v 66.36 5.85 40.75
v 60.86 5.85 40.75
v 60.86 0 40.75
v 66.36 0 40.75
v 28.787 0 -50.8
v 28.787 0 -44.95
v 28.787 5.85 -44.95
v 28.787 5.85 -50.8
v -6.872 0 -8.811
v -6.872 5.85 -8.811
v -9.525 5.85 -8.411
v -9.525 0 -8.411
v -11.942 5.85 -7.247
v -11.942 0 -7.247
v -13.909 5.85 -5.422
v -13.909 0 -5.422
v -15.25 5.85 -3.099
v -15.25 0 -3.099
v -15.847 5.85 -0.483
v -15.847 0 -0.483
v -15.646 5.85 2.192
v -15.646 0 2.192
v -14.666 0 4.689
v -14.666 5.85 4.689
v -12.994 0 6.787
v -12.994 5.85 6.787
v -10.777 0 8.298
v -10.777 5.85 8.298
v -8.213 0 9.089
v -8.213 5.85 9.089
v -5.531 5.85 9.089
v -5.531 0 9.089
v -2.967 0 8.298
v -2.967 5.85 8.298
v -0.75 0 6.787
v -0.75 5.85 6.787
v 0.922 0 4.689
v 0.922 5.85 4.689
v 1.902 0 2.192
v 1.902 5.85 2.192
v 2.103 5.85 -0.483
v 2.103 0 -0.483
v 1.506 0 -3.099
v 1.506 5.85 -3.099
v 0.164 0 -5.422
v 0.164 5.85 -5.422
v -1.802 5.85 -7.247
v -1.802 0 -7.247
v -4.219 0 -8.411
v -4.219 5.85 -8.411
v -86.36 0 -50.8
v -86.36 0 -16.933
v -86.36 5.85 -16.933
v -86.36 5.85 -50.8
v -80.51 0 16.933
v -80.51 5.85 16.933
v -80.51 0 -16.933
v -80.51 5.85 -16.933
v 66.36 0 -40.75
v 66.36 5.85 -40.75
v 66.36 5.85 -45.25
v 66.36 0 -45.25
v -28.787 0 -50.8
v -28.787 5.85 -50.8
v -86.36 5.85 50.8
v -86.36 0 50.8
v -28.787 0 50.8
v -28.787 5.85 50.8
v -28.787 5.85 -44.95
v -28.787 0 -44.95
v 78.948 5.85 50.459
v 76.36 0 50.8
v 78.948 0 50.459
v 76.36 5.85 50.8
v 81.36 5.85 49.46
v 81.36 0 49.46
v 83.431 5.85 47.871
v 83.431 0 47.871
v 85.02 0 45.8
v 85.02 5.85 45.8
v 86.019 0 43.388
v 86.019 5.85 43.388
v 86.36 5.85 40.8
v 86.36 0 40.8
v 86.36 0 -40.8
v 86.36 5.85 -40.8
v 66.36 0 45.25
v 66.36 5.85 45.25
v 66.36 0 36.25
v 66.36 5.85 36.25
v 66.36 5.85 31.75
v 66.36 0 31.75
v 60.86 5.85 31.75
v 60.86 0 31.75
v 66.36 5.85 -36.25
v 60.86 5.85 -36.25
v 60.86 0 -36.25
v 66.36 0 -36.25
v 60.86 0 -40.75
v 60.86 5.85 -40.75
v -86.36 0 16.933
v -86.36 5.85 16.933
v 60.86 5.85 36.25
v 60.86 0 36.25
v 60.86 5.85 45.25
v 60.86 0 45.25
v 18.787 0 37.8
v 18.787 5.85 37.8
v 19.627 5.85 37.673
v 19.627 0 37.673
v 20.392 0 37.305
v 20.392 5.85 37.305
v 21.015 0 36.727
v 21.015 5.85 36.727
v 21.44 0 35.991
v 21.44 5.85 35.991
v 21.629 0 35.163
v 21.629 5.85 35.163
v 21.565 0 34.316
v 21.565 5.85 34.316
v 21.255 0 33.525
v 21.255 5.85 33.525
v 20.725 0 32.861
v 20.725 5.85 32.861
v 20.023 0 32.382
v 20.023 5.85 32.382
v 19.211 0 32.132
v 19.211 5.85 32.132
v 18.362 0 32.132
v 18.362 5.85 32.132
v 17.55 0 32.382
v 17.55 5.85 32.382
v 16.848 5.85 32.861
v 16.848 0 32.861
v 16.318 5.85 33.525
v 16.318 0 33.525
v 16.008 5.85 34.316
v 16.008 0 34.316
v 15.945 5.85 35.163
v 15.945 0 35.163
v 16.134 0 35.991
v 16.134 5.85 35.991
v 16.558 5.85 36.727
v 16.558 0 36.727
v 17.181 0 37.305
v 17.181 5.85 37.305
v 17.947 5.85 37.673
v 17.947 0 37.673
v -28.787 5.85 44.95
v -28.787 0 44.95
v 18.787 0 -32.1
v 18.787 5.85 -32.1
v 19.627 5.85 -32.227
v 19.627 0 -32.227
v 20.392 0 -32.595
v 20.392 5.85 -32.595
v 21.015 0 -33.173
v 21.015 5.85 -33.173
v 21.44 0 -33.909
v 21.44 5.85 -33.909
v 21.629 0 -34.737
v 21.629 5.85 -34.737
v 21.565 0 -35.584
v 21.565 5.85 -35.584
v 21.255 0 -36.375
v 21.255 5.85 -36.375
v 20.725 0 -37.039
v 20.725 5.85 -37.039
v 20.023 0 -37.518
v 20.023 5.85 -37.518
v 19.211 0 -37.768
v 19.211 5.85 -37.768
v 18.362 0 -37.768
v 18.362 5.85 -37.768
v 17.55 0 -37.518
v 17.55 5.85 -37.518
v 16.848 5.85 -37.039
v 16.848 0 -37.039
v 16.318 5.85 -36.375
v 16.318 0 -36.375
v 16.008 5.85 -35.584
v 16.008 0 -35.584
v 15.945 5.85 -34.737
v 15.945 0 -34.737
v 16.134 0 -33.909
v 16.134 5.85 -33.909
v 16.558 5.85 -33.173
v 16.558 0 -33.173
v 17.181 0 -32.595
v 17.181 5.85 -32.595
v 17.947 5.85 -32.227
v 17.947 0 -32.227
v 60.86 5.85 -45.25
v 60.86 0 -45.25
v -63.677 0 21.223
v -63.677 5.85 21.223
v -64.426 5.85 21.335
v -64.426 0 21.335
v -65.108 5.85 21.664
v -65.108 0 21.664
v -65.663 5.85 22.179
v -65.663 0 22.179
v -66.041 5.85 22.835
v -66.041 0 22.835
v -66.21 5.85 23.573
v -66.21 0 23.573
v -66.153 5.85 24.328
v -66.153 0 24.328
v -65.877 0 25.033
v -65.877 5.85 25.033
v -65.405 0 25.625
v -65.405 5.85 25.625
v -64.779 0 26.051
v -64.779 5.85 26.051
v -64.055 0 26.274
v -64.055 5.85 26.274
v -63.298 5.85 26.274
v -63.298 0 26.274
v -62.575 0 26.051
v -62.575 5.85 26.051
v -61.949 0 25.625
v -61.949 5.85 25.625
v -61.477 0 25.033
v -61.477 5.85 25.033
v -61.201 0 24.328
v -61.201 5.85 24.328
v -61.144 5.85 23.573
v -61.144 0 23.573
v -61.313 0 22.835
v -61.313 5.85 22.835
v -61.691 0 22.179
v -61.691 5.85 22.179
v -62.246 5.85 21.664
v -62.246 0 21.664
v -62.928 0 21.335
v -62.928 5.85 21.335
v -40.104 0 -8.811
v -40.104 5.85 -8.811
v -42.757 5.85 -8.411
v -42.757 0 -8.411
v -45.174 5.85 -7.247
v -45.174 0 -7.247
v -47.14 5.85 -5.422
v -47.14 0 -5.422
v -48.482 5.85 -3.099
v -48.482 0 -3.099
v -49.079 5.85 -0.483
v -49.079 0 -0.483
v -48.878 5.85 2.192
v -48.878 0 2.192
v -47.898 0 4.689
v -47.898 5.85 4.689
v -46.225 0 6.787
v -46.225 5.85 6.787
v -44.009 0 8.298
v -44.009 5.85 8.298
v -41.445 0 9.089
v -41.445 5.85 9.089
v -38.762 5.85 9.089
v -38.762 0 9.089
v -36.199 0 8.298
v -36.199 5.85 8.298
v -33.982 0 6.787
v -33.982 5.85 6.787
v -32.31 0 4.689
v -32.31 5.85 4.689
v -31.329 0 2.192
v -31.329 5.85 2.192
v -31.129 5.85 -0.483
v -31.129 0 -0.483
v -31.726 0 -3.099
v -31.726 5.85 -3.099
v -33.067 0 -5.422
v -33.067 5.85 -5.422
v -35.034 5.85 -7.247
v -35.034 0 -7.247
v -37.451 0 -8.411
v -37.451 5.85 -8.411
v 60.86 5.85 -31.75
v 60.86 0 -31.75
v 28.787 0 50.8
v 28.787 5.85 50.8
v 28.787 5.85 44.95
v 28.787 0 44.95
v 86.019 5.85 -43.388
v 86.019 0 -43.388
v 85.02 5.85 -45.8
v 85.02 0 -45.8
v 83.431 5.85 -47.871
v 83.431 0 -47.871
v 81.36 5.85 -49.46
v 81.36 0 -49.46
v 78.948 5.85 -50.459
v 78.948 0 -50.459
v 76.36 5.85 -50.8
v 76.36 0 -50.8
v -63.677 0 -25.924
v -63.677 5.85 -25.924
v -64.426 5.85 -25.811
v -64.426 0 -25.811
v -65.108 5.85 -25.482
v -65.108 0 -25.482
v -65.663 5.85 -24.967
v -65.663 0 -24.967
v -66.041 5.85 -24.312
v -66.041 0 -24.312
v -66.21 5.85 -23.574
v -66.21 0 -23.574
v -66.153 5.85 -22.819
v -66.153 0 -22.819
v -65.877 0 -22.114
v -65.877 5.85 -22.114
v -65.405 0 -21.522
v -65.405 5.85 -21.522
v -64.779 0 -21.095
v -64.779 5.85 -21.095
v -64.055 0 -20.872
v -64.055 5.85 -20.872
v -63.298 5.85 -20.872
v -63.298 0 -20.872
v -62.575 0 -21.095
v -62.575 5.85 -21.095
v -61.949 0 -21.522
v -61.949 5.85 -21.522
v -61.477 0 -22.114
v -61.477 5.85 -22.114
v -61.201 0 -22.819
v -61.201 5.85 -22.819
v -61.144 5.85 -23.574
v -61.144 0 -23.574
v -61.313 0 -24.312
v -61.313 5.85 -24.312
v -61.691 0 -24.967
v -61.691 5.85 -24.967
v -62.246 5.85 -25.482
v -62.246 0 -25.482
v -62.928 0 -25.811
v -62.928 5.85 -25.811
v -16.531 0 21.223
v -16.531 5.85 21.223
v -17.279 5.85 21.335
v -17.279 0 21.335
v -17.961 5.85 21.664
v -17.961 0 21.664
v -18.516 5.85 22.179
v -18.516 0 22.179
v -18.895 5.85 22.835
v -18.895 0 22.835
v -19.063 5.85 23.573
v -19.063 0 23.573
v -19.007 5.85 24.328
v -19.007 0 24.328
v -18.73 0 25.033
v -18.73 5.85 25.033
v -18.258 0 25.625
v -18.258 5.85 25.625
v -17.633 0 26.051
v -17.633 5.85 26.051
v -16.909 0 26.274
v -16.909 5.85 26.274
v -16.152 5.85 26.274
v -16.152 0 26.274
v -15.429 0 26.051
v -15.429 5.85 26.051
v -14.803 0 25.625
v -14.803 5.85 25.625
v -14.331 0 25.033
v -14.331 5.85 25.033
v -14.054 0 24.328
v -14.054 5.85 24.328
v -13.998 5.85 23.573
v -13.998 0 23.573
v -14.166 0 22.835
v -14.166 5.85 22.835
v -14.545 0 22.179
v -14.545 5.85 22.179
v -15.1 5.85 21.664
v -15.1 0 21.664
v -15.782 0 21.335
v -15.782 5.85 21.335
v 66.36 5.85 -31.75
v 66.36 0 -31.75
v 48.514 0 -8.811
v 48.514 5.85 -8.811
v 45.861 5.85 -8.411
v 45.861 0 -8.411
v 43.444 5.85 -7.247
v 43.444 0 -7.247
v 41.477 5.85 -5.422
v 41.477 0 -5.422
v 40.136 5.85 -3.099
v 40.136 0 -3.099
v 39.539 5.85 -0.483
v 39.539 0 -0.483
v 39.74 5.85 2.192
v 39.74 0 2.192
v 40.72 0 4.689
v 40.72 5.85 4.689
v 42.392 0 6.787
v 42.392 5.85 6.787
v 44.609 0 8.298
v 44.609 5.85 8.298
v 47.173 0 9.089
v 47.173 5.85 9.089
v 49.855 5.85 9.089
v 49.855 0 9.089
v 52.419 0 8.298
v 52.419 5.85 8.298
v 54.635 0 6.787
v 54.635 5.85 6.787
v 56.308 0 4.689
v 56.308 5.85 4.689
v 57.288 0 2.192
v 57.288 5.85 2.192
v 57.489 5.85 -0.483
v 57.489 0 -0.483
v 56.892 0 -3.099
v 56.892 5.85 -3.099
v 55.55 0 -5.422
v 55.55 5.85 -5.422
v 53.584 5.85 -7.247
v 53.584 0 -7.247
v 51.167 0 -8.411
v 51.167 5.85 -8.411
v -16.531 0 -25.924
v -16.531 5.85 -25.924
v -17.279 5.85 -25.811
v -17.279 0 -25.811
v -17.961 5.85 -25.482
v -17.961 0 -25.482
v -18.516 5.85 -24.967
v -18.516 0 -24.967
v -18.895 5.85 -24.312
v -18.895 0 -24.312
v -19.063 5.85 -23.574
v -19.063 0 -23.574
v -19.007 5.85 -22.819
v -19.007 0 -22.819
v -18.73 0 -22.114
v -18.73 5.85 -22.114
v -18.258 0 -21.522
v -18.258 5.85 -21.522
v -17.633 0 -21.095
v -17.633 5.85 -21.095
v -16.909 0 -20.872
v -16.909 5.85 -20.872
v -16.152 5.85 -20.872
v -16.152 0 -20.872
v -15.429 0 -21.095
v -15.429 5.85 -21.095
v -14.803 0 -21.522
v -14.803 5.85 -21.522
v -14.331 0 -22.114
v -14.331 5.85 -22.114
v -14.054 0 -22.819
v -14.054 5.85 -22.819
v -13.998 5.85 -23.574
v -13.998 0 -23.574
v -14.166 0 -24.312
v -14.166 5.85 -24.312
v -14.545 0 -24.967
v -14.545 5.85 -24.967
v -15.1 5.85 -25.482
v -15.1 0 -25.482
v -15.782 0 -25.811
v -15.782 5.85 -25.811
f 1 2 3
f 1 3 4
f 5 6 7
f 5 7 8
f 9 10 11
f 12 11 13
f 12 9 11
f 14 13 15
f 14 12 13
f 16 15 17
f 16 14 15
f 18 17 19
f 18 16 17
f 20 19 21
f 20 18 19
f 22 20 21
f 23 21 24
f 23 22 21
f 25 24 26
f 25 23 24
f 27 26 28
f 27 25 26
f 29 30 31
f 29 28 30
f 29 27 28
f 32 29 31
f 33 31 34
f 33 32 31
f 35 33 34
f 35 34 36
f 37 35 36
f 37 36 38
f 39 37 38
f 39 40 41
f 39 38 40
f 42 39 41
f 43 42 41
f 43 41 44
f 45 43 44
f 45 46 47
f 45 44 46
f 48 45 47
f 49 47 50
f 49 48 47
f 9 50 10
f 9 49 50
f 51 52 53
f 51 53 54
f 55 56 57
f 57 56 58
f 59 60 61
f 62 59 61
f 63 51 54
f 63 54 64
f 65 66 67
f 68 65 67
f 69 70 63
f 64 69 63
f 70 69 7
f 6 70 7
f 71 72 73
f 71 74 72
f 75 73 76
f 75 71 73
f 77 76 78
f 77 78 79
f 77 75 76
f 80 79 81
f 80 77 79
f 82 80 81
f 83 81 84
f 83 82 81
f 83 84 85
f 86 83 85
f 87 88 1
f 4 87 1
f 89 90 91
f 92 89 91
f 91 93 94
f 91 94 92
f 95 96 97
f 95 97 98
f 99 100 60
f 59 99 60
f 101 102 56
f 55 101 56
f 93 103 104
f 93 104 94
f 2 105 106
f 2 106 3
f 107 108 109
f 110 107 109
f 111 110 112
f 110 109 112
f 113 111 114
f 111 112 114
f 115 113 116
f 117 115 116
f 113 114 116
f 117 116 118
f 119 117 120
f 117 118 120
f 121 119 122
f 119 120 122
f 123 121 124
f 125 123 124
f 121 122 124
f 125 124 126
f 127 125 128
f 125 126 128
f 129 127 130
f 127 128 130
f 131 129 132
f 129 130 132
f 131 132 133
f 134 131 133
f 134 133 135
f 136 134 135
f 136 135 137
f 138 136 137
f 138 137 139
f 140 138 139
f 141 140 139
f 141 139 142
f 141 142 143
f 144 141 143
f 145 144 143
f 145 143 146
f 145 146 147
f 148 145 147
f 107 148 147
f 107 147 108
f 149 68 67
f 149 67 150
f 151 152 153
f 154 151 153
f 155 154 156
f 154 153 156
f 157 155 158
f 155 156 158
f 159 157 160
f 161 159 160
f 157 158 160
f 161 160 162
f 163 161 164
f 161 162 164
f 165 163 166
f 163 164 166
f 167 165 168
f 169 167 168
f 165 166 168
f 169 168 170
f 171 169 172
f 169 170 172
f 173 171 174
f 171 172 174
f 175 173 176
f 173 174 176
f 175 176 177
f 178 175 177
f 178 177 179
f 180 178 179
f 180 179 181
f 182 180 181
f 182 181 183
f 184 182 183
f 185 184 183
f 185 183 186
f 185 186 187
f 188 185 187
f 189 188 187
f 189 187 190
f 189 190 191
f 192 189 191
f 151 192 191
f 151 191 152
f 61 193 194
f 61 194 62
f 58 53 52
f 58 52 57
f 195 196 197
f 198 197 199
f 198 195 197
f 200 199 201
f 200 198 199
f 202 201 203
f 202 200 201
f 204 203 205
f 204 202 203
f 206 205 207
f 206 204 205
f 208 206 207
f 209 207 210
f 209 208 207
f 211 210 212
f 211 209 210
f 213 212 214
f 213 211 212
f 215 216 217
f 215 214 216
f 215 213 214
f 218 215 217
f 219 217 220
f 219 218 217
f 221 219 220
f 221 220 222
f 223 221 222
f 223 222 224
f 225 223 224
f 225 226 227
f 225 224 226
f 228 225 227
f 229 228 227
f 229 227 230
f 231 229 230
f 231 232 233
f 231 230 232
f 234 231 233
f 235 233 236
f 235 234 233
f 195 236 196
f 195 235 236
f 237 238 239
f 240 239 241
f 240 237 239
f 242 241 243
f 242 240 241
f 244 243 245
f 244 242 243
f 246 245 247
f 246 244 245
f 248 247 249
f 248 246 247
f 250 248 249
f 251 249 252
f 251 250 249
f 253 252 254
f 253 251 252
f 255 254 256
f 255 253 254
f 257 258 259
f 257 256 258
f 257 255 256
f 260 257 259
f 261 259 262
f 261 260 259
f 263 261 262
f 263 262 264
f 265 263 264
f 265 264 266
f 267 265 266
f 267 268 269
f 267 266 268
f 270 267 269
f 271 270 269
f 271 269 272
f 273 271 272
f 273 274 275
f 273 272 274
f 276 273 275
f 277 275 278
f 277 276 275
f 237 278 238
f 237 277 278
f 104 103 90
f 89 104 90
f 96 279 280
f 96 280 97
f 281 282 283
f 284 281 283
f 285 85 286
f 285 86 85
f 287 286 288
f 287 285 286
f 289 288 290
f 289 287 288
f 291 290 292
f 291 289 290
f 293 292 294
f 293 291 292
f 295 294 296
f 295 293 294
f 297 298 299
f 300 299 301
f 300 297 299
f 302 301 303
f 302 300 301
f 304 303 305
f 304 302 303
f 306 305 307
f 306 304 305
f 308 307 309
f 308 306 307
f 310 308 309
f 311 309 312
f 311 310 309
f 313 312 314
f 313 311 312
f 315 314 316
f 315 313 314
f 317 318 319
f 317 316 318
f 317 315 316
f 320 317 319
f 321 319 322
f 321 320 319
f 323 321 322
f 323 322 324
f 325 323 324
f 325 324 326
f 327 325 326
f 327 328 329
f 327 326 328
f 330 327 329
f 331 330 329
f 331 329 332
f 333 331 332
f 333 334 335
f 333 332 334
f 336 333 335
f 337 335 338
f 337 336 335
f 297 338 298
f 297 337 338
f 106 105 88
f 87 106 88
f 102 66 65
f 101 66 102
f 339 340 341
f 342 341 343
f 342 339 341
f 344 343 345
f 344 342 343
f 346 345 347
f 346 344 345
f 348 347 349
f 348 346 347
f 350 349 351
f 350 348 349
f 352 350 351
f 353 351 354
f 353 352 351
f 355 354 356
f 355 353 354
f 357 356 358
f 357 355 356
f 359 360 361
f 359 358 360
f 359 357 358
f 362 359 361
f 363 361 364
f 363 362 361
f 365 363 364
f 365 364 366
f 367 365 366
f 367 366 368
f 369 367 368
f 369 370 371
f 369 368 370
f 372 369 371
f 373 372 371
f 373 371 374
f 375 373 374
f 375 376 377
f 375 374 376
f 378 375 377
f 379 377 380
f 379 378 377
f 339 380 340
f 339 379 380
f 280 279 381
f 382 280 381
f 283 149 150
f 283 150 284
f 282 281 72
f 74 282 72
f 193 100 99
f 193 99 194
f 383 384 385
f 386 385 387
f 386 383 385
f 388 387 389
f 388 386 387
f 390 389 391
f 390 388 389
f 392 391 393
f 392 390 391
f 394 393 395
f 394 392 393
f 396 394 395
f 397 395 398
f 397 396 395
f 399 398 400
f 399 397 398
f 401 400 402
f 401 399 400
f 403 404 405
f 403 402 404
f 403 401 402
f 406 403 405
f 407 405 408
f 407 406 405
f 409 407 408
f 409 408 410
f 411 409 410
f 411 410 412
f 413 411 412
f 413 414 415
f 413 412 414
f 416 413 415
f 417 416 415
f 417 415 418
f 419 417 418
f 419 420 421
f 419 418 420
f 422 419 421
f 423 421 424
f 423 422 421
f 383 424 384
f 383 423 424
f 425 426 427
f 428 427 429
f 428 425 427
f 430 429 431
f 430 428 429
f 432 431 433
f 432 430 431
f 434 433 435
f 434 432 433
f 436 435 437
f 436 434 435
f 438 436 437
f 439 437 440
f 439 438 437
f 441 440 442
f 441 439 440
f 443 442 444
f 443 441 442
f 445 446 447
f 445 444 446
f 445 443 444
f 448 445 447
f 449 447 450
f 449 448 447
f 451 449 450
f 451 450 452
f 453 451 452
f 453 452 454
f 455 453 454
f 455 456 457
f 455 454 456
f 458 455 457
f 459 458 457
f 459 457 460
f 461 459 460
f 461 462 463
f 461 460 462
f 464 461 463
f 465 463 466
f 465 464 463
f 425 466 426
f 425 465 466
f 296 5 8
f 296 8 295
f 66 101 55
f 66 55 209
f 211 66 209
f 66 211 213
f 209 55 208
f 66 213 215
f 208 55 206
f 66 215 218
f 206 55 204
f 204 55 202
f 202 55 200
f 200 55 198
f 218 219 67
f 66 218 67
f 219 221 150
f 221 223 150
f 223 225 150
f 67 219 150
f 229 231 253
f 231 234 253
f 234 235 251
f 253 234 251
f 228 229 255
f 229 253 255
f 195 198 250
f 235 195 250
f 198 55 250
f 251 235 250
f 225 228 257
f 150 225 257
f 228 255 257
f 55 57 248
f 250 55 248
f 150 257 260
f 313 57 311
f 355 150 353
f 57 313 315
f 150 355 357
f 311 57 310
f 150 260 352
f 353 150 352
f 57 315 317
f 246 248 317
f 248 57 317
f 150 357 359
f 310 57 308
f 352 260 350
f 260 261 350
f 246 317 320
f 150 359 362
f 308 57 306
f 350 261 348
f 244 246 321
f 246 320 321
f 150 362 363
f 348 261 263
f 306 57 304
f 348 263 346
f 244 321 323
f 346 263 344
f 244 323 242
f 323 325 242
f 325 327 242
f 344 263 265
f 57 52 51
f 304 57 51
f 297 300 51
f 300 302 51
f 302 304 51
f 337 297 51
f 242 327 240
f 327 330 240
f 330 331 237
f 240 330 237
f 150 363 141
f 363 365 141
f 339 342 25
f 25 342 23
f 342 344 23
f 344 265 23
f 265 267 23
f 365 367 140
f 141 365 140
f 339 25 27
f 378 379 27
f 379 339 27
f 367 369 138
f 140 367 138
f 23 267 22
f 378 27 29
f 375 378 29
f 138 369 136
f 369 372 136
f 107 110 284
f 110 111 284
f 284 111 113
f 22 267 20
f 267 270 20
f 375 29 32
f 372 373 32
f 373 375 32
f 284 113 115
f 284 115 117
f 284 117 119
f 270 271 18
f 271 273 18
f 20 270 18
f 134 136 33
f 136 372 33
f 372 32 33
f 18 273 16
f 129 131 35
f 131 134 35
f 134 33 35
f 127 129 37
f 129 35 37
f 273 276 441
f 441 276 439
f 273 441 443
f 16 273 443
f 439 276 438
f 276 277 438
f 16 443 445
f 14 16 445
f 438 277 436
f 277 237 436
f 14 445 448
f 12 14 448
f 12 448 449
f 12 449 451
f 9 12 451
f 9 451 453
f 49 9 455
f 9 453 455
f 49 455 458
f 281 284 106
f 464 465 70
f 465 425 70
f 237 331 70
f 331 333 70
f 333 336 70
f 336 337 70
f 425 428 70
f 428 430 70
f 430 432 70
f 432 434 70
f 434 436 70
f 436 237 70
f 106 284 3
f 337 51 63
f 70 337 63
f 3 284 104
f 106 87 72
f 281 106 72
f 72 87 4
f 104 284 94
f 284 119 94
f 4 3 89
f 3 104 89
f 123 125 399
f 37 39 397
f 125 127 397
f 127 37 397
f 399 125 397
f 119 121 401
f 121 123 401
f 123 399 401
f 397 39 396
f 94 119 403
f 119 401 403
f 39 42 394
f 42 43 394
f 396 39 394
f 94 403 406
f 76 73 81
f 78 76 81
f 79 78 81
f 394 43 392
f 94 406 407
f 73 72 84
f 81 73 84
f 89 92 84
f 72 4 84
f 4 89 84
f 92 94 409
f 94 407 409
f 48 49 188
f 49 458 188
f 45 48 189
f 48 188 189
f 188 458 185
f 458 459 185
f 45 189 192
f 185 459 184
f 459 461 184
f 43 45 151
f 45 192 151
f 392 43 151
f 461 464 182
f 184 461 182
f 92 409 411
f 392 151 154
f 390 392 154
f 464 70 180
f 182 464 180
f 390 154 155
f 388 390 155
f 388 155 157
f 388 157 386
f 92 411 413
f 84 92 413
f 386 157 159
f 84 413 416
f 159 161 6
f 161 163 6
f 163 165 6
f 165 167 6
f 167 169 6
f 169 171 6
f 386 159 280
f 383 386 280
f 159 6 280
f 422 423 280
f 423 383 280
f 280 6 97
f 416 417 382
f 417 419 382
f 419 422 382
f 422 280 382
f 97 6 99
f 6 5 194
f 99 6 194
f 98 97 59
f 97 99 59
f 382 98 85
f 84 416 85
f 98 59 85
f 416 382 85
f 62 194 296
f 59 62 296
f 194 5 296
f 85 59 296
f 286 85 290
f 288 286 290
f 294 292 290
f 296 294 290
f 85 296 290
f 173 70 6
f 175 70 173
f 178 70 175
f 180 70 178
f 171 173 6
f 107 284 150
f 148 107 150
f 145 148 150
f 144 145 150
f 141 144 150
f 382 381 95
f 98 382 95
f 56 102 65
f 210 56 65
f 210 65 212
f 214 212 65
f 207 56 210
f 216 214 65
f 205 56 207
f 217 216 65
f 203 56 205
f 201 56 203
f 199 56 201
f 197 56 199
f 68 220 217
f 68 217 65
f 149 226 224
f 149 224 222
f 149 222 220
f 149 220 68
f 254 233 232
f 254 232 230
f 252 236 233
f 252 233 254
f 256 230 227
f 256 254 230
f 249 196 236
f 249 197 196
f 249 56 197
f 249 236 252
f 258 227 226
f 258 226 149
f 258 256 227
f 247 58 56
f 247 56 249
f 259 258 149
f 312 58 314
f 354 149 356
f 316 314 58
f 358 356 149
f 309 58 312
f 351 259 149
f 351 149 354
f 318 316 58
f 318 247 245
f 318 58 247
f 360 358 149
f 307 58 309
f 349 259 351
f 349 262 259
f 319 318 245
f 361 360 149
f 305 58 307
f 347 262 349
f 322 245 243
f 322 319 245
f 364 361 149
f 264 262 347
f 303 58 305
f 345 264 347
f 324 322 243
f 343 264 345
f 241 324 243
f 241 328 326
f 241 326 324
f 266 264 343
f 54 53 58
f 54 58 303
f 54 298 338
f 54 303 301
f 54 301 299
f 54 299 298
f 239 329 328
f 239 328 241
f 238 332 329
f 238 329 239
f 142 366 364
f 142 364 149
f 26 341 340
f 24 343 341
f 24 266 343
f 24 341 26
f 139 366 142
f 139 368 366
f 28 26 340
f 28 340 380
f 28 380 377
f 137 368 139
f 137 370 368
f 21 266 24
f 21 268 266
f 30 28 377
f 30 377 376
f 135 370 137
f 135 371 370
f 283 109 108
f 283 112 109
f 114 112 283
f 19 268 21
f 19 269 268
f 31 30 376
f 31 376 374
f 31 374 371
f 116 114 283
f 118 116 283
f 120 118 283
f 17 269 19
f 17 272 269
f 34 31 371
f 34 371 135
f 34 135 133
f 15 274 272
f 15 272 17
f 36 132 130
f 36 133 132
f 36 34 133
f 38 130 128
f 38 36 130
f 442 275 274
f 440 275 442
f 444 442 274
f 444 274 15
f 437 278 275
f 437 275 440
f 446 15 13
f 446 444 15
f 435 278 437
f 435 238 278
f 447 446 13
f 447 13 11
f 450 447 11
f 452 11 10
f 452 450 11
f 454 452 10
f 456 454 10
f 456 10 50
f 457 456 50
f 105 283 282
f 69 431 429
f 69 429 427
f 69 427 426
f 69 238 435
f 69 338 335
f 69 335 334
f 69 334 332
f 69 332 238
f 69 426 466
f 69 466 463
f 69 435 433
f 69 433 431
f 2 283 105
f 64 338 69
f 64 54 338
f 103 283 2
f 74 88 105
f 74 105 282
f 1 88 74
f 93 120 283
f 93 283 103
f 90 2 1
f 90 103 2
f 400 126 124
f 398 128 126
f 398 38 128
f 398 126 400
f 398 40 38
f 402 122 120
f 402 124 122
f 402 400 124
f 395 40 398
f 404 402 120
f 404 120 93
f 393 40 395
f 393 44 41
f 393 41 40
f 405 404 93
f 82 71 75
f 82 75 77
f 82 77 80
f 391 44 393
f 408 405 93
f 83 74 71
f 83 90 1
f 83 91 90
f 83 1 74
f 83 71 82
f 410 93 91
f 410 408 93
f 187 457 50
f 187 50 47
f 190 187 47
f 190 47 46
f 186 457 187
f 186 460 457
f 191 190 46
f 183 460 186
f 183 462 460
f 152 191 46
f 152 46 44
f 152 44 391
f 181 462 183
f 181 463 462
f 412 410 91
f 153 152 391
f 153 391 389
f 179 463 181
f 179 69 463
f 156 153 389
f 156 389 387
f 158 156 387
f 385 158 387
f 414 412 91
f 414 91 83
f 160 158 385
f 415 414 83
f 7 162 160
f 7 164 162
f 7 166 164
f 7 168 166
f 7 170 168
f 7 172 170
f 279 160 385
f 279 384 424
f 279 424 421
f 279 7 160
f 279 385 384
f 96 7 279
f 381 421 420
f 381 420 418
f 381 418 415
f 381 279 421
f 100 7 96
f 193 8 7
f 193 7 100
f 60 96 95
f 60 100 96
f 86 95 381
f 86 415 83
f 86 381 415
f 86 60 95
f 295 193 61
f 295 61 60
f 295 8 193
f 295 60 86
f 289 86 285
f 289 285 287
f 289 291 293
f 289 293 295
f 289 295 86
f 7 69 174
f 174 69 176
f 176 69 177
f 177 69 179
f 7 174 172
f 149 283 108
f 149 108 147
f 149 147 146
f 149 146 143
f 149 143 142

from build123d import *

# Parameters (mm, degrees)
SKETCH1_W           = 172.72
SKETCH1_H           = 101.6
BOSS_EXTRUDE1_DEPTH = 5.85
SKETCH4_W           = 5.85
SKETCH4_H           = 33.866666666
SKETCH4_W_2         = 57.573333334
SKETCH4_H_2         = 5.85
SKETCH4_W_3         = 5.5
SKETCH4_H_3         = 4.5
CUT_EXTRUDE5_DEPTH  = 10
SKETCH5_R           = 9
SKETCH5_R_2         = 2.54
CUT_EXTRUDE10_DEPTH = 16
FILLET1_R           = 10
SKETCH6_R           = 2.85
CUT_EXTRUDE11_DEPTH = 10


with BuildPart() as part:
    # Sketch1 → Boss-Extrude1 (new body)
    with BuildSketch(Plane(origin=(0, 0, 0), x_dir=(1, 0, 0), z_dir=(0, 1, 0))):
        Rectangle(SKETCH1_W, SKETCH1_H)
    extrude(amount=BOSS_EXTRUDE1_DEPTH)

    # Sketch4 → Cut-Extrude5 (cut)
    with BuildSketch(Plane(origin=(0, 5.85, 0), x_dir=(1, 0, 0), z_dir=(0, 1, 0))):
        with Locations((-83.435, 0)):
            Rectangle(SKETCH4_W, SKETCH4_H)
        with Locations((0, -47.875)):
            Rectangle(SKETCH4_W_2, SKETCH4_H_2)
        with Locations((0, 47.875)):
            Rectangle(SKETCH4_W_2, SKETCH4_H_2)
        with Locations((63.61, 43)):
            Rectangle(SKETCH4_W_3, SKETCH4_H_3)
        with Locations((63.61, -43)):
            Rectangle(SKETCH4_W_3, SKETCH4_H_3)
        with Locations((63.61, -34)):
            Rectangle(SKETCH4_W_3, SKETCH4_H_3)
        with Locations((63.61, 34)):
            Rectangle(SKETCH4_W_3, SKETCH4_H_3)
    extrude(amount=-CUT_EXTRUDE5_DEPTH, mode=Mode.SUBTRACT)

    # Sketch5 → Cut-Extrude10 (cut)
    with BuildSketch(Plane(origin=(0, 0, 0), x_dir=(1, 0, 0), z_dir=(0, 1, 0))):
        with Locations((-6.8720506, -0.189440326)):
            Circle(SKETCH5_R)
        with Locations((-40.10375, -0.189440326)):
            Circle(SKETCH5_R)
        with Locations((-63.676922318, 23.383731992)):
            Circle(SKETCH5_R_2)
        with Locations((-16.530577682, 23.383731992)):
            Circle(SKETCH5_R_2)
        with Locations((-63.676922318, -23.762612643)):
            Circle(SKETCH5_R_2)
        with Locations((-16.530577682, -23.762612643)):
            Circle(SKETCH5_R_2)
        with Locations((48.5139194, -0.189440326)):
            Circle(SKETCH5_R)
    extrude(amount=CUT_EXTRUDE10_DEPTH, mode=Mode.SUBTRACT)

    # Fillet1
    fillet1_edges = [part.edges().sort_by_distance(p)[0] for p in [
        (86.36, 2.925, -50.8),
        (86.36, 2.925, 50.8),
    ]]
    fillet(fillet1_edges, radius=FILLET1_R)

    # Sketch6 → Cut-Extrude11 (cut)
    with BuildSketch(Plane(origin=(0, 5.85, 0), x_dir=(1, 0, 0), z_dir=(0, 1, 0))):
        with Locations((18.786666667, -34.95)):
            Circle(SKETCH6_R)
        with Locations((18.786666667, 34.95)):
            Circle(SKETCH6_R)
    extrude(amount=-CUT_EXTRUDE11_DEPTH, mode=Mode.SUBTRACT)


solid = part.part
